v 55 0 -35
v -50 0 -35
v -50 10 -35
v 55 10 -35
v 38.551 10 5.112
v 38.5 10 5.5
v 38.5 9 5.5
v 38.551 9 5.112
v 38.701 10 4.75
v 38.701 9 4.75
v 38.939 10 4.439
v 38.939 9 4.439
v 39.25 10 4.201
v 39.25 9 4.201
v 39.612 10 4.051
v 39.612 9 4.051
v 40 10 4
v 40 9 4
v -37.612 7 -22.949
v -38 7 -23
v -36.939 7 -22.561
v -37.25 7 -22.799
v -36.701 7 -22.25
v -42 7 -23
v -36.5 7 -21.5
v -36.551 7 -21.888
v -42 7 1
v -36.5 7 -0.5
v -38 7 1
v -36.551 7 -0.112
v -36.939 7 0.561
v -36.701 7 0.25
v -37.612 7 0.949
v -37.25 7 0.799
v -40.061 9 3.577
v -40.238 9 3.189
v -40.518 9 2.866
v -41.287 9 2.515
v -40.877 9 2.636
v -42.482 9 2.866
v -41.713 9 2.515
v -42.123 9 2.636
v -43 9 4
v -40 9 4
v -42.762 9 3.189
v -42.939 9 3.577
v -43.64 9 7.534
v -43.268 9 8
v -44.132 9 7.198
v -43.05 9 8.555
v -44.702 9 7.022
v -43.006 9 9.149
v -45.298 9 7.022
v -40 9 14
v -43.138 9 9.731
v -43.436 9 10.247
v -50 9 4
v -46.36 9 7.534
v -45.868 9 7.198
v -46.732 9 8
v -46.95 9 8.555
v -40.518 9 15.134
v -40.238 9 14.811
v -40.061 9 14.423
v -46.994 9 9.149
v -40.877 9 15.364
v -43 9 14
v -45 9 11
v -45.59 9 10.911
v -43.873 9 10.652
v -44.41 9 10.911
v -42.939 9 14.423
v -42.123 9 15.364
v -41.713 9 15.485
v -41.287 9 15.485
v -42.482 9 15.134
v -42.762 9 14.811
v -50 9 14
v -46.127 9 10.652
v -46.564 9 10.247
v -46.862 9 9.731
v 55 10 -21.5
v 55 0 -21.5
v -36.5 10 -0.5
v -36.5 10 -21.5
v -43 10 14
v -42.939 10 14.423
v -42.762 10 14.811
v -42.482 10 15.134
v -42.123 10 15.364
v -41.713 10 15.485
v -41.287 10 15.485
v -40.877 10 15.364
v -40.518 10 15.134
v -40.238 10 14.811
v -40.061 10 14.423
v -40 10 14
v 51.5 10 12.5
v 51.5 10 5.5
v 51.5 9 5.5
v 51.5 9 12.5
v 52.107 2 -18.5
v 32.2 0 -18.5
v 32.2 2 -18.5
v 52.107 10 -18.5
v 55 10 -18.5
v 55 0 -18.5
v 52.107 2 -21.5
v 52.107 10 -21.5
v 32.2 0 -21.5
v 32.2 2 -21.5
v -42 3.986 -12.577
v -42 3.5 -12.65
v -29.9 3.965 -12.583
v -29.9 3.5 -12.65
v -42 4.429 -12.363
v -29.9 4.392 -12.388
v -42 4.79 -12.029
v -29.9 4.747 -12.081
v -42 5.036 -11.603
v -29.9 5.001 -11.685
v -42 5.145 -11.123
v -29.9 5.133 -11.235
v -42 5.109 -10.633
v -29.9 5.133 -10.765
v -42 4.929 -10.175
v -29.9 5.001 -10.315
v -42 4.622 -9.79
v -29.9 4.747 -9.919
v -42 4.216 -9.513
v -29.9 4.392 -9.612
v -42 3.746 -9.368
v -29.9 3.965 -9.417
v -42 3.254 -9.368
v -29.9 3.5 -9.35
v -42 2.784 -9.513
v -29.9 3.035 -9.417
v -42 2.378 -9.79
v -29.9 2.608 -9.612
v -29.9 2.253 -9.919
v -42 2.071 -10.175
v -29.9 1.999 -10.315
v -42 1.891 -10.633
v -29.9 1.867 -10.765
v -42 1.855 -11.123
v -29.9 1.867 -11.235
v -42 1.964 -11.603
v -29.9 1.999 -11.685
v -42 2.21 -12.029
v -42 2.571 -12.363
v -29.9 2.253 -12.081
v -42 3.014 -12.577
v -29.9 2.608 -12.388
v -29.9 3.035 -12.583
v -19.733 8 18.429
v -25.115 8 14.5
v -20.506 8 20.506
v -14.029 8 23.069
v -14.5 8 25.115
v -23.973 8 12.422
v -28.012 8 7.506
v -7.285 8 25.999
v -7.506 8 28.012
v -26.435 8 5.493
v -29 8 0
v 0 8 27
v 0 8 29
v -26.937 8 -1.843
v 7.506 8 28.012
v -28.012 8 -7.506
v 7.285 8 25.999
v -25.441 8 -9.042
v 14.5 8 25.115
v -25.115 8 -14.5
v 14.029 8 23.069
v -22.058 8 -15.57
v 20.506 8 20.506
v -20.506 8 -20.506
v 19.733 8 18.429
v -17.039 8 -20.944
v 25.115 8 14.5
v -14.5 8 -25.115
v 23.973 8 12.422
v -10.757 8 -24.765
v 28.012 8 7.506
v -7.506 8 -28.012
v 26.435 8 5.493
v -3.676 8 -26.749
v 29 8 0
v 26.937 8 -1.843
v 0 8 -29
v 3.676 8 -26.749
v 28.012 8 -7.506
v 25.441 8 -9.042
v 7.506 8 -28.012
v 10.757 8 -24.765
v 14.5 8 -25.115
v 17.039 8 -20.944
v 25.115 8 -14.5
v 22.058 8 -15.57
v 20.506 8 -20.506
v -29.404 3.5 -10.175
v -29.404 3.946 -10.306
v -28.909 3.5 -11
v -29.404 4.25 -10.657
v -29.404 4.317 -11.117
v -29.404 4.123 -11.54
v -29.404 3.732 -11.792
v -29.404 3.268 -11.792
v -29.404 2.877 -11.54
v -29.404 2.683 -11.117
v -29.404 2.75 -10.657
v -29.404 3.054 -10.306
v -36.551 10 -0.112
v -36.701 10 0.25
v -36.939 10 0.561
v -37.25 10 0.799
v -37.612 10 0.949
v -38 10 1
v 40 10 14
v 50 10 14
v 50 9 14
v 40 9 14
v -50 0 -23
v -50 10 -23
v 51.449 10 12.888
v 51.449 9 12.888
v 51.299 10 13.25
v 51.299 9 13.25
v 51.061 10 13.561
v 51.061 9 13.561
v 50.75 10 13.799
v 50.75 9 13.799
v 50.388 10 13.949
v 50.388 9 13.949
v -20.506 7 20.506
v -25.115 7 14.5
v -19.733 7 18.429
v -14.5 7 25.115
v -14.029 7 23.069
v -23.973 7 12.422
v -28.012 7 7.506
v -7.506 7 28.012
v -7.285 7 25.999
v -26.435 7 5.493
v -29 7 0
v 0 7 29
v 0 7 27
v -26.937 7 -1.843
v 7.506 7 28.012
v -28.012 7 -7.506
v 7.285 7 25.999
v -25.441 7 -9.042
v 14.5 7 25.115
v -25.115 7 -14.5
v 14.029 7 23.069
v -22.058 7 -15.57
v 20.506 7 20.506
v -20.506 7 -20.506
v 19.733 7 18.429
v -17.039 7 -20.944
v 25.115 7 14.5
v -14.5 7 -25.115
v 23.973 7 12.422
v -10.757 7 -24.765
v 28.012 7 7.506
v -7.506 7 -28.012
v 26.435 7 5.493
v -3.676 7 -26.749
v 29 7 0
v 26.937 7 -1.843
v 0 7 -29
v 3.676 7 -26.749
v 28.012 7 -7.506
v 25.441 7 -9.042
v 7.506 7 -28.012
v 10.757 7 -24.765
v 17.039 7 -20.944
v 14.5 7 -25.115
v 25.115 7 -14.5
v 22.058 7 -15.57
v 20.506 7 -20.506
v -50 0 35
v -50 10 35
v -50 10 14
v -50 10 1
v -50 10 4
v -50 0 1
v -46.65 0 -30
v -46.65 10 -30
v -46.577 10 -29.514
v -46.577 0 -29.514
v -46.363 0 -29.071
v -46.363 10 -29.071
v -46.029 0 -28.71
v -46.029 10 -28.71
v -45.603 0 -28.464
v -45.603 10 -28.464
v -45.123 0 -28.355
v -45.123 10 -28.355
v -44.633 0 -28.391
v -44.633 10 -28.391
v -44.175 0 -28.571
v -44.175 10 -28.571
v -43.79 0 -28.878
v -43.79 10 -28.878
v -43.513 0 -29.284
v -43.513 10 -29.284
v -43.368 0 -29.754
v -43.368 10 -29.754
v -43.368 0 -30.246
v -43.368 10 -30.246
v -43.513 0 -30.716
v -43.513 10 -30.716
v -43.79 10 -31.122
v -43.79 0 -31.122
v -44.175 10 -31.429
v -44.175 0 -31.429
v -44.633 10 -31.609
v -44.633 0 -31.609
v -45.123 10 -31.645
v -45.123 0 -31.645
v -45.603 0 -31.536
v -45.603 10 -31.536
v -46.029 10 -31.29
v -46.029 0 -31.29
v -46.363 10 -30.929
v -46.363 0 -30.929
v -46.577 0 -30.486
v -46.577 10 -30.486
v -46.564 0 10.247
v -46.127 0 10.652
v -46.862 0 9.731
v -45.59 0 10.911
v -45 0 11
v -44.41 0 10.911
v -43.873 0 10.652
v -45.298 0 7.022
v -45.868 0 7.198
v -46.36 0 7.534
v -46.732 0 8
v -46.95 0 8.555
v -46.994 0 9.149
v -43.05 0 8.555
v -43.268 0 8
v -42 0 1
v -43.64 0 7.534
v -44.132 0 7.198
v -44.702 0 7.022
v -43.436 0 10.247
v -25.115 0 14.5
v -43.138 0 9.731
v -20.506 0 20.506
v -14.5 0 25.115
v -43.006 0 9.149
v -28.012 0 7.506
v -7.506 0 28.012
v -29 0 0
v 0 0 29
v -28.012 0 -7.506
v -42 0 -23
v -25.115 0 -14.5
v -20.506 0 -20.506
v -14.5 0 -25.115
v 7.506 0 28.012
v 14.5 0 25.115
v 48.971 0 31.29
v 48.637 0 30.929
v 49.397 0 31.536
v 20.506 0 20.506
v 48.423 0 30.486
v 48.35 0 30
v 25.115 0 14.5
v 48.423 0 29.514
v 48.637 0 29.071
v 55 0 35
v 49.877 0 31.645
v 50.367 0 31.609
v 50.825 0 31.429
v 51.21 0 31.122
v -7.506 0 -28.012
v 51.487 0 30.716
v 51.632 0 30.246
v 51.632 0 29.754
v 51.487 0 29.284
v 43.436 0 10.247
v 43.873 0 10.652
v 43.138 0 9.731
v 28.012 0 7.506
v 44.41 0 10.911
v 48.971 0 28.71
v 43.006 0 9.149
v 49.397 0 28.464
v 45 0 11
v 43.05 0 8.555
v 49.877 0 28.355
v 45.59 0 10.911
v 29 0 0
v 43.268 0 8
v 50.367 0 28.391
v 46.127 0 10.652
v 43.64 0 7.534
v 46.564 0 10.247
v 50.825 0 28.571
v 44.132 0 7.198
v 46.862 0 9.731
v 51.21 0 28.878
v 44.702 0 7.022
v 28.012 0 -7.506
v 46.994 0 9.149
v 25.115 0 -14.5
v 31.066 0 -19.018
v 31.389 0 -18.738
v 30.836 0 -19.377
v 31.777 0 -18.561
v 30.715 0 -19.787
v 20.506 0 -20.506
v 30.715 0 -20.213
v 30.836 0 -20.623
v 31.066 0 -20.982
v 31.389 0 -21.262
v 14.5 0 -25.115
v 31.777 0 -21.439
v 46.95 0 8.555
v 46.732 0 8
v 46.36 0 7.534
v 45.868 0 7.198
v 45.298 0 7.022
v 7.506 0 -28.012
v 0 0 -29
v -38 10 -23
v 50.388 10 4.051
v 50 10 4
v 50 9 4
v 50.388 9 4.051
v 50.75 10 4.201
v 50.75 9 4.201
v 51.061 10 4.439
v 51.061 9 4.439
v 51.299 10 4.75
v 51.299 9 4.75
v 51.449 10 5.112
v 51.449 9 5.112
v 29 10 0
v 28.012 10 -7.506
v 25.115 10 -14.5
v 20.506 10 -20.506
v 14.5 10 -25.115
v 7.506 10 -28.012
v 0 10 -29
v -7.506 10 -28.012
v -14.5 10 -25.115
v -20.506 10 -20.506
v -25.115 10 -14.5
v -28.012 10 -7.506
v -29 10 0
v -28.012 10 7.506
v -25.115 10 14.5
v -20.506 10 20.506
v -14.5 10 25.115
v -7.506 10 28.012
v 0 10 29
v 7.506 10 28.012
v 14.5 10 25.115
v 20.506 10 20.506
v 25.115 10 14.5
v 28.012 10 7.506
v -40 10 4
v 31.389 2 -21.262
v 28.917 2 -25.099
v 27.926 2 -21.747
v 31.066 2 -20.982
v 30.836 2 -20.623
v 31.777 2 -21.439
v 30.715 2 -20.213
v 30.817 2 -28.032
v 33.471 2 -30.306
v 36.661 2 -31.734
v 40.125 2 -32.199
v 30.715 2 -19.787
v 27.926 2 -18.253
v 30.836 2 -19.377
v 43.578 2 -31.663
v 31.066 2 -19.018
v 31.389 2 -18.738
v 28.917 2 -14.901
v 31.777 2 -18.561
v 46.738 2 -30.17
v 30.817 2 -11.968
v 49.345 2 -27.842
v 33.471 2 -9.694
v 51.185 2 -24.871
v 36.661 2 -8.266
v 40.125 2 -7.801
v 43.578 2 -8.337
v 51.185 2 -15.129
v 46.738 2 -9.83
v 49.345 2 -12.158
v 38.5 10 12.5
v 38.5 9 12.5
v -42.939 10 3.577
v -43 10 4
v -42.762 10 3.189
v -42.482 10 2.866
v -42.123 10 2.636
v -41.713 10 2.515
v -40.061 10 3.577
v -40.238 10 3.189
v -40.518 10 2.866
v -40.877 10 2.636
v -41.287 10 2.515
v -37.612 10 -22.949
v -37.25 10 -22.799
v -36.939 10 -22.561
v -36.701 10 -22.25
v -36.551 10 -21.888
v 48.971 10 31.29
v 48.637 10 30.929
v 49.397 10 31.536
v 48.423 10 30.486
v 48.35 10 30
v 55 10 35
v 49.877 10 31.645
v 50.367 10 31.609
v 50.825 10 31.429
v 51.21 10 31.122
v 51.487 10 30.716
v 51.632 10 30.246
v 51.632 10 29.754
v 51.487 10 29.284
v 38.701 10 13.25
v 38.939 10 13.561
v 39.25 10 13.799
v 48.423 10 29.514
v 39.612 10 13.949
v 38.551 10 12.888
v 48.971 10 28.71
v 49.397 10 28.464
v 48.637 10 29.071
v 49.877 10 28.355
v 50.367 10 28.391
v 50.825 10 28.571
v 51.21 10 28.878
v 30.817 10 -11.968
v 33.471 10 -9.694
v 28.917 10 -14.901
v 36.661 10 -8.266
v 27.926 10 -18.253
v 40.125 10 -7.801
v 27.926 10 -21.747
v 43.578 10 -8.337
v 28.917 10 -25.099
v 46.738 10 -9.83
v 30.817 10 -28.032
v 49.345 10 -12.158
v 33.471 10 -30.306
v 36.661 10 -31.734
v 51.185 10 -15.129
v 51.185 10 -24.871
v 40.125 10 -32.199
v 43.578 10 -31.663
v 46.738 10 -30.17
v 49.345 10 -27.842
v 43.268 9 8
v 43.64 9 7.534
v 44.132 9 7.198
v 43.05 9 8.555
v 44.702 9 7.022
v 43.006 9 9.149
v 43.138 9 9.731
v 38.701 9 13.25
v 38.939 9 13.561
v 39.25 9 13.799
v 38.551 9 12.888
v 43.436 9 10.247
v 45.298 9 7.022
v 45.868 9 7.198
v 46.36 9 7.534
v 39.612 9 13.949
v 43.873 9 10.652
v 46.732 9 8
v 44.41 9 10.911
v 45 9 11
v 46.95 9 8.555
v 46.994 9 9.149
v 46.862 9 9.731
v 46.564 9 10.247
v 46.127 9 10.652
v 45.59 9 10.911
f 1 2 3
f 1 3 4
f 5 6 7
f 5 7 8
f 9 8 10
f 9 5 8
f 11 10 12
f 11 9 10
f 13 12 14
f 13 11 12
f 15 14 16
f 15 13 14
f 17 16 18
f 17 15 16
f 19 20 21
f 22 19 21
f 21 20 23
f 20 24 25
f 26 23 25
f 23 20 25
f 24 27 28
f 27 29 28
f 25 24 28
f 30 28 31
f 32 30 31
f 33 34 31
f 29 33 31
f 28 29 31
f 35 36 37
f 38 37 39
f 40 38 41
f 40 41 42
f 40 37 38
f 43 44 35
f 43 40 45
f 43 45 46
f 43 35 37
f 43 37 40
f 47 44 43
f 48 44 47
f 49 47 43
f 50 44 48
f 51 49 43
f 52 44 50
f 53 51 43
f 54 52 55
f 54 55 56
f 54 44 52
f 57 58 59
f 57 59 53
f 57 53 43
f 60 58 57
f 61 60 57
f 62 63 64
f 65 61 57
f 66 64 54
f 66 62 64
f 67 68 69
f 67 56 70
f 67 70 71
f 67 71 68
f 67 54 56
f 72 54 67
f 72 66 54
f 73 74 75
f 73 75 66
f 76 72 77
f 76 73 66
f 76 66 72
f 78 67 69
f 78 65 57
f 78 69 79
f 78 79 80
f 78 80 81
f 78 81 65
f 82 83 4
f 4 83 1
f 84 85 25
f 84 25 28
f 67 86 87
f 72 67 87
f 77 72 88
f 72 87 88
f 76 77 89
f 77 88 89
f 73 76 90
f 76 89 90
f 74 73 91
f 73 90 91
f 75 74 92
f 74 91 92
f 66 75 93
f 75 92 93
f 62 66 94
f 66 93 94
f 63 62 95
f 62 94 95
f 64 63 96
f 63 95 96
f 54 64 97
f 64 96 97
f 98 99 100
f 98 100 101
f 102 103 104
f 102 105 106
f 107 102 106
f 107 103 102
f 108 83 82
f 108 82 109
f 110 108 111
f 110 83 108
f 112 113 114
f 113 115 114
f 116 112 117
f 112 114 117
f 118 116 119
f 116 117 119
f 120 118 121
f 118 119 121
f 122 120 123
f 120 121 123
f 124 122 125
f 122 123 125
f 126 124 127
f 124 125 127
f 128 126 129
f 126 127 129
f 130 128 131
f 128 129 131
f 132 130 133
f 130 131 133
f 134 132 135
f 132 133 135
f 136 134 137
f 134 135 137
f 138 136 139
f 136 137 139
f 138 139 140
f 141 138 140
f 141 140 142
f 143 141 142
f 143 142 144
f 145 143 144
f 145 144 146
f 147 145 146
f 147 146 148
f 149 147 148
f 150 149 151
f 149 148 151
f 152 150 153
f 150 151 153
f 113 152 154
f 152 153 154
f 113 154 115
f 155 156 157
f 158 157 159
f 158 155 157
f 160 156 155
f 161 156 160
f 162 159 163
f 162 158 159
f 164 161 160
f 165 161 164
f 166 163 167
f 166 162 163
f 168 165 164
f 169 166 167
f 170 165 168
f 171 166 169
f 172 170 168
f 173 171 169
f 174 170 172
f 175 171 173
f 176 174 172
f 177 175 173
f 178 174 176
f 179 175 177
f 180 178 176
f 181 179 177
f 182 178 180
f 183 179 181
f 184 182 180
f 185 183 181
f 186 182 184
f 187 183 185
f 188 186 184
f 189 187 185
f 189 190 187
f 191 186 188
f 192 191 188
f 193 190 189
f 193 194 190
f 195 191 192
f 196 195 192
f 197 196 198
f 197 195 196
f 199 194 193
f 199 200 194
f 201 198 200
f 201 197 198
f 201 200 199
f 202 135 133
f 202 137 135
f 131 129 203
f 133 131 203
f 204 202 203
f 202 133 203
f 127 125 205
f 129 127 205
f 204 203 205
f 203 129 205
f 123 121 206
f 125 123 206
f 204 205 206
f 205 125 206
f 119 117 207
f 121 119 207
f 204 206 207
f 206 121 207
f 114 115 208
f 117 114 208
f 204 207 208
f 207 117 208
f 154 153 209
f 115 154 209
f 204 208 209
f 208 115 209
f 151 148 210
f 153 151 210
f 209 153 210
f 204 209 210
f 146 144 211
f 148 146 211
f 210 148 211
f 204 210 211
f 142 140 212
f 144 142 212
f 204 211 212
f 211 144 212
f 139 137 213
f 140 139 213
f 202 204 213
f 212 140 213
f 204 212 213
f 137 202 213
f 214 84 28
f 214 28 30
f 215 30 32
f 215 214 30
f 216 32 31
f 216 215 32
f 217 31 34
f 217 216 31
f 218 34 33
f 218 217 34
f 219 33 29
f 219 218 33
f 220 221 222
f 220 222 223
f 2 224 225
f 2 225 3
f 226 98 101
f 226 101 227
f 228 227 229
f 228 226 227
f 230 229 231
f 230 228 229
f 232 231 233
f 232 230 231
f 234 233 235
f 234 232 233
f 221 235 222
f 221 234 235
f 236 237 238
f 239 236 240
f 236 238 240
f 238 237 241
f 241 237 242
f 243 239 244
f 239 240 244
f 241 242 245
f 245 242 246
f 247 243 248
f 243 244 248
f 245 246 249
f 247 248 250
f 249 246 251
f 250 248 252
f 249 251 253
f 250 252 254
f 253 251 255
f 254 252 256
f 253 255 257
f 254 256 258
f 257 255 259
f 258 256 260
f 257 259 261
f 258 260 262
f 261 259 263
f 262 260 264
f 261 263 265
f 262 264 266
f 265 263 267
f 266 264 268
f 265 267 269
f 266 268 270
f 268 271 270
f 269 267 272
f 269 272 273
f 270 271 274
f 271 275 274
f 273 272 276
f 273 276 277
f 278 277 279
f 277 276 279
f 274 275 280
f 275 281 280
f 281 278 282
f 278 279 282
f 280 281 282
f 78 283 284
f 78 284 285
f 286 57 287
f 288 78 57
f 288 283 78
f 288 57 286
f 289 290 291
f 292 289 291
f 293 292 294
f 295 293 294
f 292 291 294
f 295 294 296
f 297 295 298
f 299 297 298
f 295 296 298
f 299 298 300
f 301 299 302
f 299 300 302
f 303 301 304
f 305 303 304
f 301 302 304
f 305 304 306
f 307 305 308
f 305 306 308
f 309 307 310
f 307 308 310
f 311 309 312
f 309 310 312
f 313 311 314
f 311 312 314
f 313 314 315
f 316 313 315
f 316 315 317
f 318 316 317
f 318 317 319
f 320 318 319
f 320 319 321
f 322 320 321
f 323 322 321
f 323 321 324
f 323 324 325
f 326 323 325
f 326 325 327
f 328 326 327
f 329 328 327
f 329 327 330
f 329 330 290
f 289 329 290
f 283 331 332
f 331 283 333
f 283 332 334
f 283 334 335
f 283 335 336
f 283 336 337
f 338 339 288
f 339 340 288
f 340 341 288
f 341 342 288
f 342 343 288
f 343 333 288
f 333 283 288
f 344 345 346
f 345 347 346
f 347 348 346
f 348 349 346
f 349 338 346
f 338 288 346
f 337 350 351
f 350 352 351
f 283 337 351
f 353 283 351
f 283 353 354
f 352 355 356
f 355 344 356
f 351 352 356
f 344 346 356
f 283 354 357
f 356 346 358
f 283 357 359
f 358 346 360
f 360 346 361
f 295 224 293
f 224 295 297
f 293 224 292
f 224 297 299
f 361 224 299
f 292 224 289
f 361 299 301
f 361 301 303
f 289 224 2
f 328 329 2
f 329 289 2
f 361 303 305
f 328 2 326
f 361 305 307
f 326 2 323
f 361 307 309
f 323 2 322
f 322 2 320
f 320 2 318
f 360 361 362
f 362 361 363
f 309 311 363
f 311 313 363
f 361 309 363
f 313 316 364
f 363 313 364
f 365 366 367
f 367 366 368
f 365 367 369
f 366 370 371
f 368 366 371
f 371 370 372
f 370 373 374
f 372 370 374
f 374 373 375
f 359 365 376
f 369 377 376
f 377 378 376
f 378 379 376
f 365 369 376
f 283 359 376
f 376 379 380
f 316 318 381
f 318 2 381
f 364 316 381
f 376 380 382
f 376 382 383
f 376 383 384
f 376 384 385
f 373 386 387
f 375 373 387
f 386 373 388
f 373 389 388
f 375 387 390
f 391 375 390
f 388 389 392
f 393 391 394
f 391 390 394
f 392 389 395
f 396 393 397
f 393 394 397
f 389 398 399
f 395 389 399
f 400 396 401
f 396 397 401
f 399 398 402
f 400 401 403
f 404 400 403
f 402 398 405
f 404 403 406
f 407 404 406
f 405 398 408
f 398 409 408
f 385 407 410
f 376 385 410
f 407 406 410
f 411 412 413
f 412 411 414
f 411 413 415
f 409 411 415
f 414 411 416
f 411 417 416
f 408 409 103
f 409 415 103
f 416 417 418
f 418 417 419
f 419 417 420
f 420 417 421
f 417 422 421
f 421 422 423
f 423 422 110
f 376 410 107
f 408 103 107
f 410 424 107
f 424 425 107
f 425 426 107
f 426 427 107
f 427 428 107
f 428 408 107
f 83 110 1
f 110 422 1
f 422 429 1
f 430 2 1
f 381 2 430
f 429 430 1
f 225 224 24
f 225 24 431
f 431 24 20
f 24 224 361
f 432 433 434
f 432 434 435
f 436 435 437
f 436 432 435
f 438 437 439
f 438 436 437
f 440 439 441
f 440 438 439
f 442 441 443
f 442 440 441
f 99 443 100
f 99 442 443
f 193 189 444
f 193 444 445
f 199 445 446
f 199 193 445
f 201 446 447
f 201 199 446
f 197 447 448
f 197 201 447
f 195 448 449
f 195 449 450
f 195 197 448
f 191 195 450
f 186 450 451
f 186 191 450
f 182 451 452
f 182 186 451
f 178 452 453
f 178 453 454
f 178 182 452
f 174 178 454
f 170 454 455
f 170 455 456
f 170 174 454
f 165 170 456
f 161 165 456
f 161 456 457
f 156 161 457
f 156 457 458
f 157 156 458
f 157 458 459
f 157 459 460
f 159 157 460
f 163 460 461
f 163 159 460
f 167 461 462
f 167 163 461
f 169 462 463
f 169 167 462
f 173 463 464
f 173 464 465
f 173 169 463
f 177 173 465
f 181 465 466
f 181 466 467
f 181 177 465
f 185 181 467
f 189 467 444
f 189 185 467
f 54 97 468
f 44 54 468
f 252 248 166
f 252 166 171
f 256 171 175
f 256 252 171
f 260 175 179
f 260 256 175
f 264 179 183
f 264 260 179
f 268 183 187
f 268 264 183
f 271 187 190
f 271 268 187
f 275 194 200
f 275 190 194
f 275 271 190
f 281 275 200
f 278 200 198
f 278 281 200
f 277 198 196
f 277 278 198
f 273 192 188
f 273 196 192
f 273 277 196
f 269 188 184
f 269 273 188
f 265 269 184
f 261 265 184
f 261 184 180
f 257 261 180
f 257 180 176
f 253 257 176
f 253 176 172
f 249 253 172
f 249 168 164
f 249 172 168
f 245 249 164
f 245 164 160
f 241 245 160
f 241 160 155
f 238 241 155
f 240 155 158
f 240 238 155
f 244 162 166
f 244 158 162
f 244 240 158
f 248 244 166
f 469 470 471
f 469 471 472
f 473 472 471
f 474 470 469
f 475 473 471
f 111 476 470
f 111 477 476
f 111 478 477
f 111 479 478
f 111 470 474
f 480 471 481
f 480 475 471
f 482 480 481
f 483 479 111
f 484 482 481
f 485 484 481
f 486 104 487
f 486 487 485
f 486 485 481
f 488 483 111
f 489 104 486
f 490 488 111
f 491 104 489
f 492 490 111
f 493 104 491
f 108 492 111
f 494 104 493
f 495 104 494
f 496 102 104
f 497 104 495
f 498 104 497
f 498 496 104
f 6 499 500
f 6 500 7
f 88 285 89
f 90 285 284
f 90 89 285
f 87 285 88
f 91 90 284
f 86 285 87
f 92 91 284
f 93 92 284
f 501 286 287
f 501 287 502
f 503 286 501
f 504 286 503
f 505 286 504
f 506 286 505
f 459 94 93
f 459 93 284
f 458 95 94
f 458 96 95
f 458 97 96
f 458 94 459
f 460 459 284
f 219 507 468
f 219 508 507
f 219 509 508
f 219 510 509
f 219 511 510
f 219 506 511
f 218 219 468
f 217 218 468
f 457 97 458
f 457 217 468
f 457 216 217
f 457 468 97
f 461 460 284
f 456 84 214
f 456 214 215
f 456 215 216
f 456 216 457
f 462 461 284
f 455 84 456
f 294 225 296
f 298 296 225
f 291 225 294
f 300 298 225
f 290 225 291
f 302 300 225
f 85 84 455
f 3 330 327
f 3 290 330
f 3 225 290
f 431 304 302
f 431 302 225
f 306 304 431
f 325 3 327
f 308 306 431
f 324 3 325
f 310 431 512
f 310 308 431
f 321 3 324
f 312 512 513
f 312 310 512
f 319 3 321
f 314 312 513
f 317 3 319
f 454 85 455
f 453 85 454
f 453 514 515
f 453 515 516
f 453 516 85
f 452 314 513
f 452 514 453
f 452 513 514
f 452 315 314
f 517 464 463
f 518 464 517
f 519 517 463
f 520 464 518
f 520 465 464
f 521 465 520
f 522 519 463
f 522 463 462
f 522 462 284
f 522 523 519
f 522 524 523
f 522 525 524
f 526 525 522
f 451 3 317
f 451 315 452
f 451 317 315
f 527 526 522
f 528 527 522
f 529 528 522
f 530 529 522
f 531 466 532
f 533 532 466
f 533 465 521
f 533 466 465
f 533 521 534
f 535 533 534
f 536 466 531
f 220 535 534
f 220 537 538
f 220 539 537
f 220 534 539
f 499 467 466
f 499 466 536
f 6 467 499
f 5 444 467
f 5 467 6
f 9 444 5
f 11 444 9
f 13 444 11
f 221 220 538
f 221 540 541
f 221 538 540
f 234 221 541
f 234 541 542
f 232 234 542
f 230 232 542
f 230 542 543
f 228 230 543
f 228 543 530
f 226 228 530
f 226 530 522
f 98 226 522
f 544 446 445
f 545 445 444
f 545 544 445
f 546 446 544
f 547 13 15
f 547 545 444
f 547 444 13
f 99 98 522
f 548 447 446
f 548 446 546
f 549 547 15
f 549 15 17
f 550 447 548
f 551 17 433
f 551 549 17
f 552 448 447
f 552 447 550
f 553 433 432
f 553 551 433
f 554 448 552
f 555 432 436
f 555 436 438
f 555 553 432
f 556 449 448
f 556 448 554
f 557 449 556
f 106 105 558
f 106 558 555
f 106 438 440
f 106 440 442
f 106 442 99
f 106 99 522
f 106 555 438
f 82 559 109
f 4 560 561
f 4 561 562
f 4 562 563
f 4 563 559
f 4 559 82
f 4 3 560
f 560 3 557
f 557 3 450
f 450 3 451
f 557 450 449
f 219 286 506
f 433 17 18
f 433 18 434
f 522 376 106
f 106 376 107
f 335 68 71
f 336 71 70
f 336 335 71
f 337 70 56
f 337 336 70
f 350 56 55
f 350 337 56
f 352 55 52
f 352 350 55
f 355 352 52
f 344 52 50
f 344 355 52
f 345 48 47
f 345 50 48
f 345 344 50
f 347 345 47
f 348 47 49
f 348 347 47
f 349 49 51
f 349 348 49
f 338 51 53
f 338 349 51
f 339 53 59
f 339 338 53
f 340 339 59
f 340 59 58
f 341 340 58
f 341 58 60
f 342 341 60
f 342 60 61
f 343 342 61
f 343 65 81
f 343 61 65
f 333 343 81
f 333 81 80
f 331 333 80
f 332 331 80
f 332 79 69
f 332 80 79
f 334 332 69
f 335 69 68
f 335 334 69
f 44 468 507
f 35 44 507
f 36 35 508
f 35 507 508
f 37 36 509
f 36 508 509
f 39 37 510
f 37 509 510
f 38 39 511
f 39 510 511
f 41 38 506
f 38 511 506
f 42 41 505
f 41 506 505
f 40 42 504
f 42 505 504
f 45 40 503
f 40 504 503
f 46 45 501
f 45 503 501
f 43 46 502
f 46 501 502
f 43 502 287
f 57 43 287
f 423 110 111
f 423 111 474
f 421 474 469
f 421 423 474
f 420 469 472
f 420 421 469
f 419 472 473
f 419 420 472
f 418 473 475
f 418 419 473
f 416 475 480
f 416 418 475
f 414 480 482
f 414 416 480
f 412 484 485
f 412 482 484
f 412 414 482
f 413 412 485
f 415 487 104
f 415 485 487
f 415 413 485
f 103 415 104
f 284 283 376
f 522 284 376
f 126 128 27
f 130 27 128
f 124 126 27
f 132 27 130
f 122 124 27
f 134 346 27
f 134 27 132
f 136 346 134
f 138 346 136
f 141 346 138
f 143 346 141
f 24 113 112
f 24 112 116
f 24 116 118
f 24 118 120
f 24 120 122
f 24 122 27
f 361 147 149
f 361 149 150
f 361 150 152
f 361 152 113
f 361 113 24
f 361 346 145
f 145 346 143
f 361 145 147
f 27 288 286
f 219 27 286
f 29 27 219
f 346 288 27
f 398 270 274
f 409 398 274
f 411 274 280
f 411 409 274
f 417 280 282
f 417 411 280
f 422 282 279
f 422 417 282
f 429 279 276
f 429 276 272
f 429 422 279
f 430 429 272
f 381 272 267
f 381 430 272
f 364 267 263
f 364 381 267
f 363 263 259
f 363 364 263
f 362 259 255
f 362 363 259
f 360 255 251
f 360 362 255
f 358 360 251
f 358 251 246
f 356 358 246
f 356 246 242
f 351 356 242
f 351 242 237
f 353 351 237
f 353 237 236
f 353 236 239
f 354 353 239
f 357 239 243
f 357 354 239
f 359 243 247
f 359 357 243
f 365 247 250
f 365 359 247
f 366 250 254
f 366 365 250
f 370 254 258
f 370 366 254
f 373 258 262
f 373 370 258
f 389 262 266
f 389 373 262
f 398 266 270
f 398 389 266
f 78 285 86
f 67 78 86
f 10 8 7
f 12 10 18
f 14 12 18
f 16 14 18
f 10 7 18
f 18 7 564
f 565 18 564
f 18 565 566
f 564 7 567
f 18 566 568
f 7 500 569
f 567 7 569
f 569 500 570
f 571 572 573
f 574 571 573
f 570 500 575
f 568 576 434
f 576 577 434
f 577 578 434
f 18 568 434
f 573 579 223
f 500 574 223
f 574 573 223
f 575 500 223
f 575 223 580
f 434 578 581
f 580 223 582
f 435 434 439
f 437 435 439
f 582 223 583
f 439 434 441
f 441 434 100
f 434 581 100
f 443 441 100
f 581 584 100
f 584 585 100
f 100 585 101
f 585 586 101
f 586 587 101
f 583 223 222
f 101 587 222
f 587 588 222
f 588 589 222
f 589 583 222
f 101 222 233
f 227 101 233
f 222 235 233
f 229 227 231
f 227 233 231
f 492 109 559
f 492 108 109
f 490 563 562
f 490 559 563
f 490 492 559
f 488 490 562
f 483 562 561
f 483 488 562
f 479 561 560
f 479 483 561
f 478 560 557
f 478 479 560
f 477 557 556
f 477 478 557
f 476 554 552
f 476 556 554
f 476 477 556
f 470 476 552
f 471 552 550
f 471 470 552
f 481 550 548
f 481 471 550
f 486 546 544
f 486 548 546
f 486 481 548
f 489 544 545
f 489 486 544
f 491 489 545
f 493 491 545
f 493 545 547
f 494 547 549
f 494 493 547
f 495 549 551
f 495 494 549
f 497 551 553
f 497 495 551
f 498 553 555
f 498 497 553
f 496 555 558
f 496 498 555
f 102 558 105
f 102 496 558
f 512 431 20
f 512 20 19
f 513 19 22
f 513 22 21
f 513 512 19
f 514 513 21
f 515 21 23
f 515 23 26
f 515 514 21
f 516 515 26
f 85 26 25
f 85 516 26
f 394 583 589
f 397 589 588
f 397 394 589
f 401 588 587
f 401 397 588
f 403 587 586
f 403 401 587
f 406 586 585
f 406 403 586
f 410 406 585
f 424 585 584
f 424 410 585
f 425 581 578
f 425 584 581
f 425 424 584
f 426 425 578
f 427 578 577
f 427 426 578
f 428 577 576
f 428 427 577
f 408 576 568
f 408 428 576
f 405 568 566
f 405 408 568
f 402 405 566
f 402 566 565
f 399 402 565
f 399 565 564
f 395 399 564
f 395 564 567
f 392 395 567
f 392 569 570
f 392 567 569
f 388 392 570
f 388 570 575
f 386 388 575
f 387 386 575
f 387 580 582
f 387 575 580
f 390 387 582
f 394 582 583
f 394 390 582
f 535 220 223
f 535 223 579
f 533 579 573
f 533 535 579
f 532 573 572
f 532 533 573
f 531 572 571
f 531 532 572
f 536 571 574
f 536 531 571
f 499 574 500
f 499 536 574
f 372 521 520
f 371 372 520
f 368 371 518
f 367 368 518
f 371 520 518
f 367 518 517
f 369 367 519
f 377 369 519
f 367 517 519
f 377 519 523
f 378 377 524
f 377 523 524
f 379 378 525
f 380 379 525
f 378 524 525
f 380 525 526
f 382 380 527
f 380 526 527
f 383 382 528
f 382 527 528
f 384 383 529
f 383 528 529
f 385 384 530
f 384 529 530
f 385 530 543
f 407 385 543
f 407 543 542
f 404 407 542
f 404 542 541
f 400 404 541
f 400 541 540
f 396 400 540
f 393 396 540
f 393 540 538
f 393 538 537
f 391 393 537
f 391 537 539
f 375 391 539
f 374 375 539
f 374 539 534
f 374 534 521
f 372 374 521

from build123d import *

# Parameters (mm, degrees)
ESQUISSE1_W               = 105
ESQUISSE1_H               = 70
ESQUISSE1_R               = 27
EXTRUSION1_DEPTH          = 10
ENL_V_START               = -8
ESQUISSE2_R               = 12.2
ENL_V_MAT_EXTRU_1_DEPTH   = 8
ESQUISSE3_R               = 2
ENL_V_MAT_EXTRU_2_DEPTH   = 66.954529791
ENL_V_MAT_EXTRU_3_DEPTH   = 1
ESQUISSE5_R               = 29
ENL_V_MAT_EXTRU_4_DEPTH   = 7
ENL_V_START_2             = -2
ESQUISSE6_R               = 29
ENL_V_MAT_EXTRU_6_DEPTH   = 2
ENL_V_MAT_EXTRU_7_REACH   = 67.955
ESQUISSE7_W               = 8
ESQUISSE7_H               = 24
ENL_V_MAT_EXTRU_8_DEPTH   = 3
TROU_TARAUD_M4X0_71_D     = 3.3
TROU_TARAUD_M4X0_71_DEPTH = 12.1
TROU_TARAUD_M4X0_71_TIP   = 0.991420021
TROU_TARAUD_M4X0_72_D     = 3.3


with BuildPart() as part:
    # Esquisse1 → Extrusion1 (new body)
    with BuildSketch(Plane(origin=(0, 0, 0), x_dir=(1, 0, 0), z_dir=(0, 1, 0))):
        with Locations((2.5, 0)):
            Rectangle(ESQUISSE1_W, ESQUISSE1_H)
        with Locations(Location((0, 0, 0), (0, 0, 270))):
            Circle(ESQUISSE1_R, mode=Mode.SUBTRACT)
    extrude(amount=EXTRUSION1_DEPTH)

    # Esquisse2 → Enlèv. mat.-Extru.1 (cut)
    with BuildSketch(Plane(origin=(0, 10, 0), x_dir=(-1, 0, 0), z_dir=(0, 1, 0)).offset(ENL_V_START)):
        with Locations(Location((-40, -20, 0), (0, 0, 90))):
            Circle(ESQUISSE2_R)
    extrude(amount=ENL_V_MAT_EXTRU_1_DEPTH, mode=Mode.SUBTRACT)

    # Esquisse3 → Enlèv. mat.-Extru.2 (cut, through all)
    with BuildSketch(Plane(origin=(0, 0, 0), x_dir=(1, 0, 0), z_dir=(0, 1, 0))):
        with Locations(Location((45, -9, 0), (0, 0, 270))):
            Circle(ESQUISSE3_R)
        with Locations(Location((-45, -9, 0), (0, 0, 270))):
            Circle(ESQUISSE3_R)
        with BuildLine():
            Line((32.2, 18.5), (55, 18.5))
            Line((55, 18.5), (55, 21.5))
            Line((55, 21.5), (32.2, 21.5))
            ThreePointArc((32.2, 21.5), (30.7, 20), (32.2, 18.5))
        make_face()
    extrude(amount=ENL_V_MAT_EXTRU_2_DEPTH, mode=Mode.SUBTRACT)

    # Esquisse4 → Enlèv. mat.-Extru.3 (cut)
    with BuildSketch(Plane(origin=(0, 10, 0), x_dir=(-1, 0, 0), z_dir=(0, 1, 0))):
        with BuildLine():
            Line((-50, 14), (-40, 14))
            ThreePointArc((-40, 14), (-38.939339828, 13.560660172), (-38.5, 12.5))
            Line((-38.5, 12.5), (-38.5, 5.5))
            ThreePointArc((-38.5, 5.5), (-38.939339828, 4.439339828), (-40, 4))
            Line((-40, 4), (-50, 4))
            ThreePointArc((-50, 4), (-51.060660172, 4.439339828), (-51.5, 5.5))
            Line((-51.5, 5.5), (-51.5, 12.5))
            ThreePointArc((-51.5, 12.5), (-51.060660172, 13.560660172), (-50, 14))
        make_face()
        with BuildLine():
            Line((50, 14), (43, 14))
            ThreePointArc((43, 14), (41.5, 15.5), (40, 14))
            Line((40, 14), (40, 4))
            ThreePointArc((40, 4), (41.5, 2.5), (43, 4))
            Line((43, 4), (50, 4))
            Line((50, 4), (50, 14))
        make_face()
    extrude(amount=-ENL_V_MAT_EXTRU_3_DEPTH, mode=Mode.SUBTRACT)

    # Esquisse5 → Enlèv. mat.-Extru.4 (cut)
    with BuildSketch(Plane(origin=(0, 0, 0), x_dir=(1, 0, 0), z_dir=(0, 1, 0))):
        Circle(ESQUISSE5_R)
    extrude(amount=ENL_V_MAT_EXTRU_4_DEPTH, mode=Mode.SUBTRACT)

    # Esquisse6 → Enlèv. mat.-Extru.6 (cut)
    with BuildSketch(Plane(origin=(0, 10, 0), x_dir=(-1, 0, 0), z_dir=(0, 1, 0)).offset(ENL_V_START_2)):
        with Locations(Location((0, 0, 0), (0, 0, 180))):
            Circle(ESQUISSE6_R)
    extrude(amount=ENL_V_MAT_EXTRU_6_DEPTH, mode=Mode.SUBTRACT)

    # Esquisse7 → Enlèv. mat.-Extru.7 (cut, up to next)
    with BuildSketch(Plane(origin=(0, 0, 0), x_dir=(1, 0, 0), z_dir=(0, 1, 0)), mode=Mode.PRIVATE) as enl_v_mat_extru_7_sk1:
        with Locations((-46, 11)):
            Rectangle(ESQUISSE7_W, ESQUISSE7_H)
    enl_v_mat_extru_7_tool1 = extrude(enl_v_mat_extru_7_sk1.sketch, amount=ENL_V_MAT_EXTRU_7_REACH, mode=Mode.PRIVATE) & part.part
    add(enl_v_mat_extru_7_tool1.solids().sort_by_distance((-46, 0, -11))[0], mode=Mode.SUBTRACT)

    # Esquisse8 → Enlèv. mat.-Extru.8 (cut)
    with BuildSketch(Plane(origin=(0, 10, 0), x_dir=(-1, 0, 0), z_dir=(0, 1, 0))):
        with BuildLine():
            Line((50, -23), (38, -23))
            ThreePointArc((38, -23), (36.939339828, -22.560660172), (36.5, -21.5))
            Line((36.5, -21.5), (36.5, -0.5))
            ThreePointArc((36.5, -0.5), (36.939339828, 0.560660172), (38, 1))
            Line((38, 1), (50, 1))
            Line((50, 1), (50, -23))
        make_face()
    extrude(amount=-ENL_V_MAT_EXTRU_8_DEPTH, mode=Mode.SUBTRACT)

    # Trou taraudé M4x0.71
    with Locations(Plane.ZY.offset(42)):
        with Locations((-11, 3.5)):
            Hole(TROU_TARAUD_M4X0_71_D / 2, depth=TROU_TARAUD_M4X0_71_DEPTH)
            with Locations((0, 0, -(TROU_TARAUD_M4X0_71_DEPTH + TROU_TARAUD_M4X0_71_TIP / 2))):  # 118° drill point
                Cone(0, TROU_TARAUD_M4X0_71_D / 2, TROU_TARAUD_M4X0_71_TIP, mode=Mode.SUBTRACT)

    # Trou taraudé M4x0.72 (through all)
    with Locations(Plane.XZ):
        with Locations((-45, -30), (50, 30)):
            Hole(TROU_TARAUD_M4X0_72_D / 2)


solid = part.part
